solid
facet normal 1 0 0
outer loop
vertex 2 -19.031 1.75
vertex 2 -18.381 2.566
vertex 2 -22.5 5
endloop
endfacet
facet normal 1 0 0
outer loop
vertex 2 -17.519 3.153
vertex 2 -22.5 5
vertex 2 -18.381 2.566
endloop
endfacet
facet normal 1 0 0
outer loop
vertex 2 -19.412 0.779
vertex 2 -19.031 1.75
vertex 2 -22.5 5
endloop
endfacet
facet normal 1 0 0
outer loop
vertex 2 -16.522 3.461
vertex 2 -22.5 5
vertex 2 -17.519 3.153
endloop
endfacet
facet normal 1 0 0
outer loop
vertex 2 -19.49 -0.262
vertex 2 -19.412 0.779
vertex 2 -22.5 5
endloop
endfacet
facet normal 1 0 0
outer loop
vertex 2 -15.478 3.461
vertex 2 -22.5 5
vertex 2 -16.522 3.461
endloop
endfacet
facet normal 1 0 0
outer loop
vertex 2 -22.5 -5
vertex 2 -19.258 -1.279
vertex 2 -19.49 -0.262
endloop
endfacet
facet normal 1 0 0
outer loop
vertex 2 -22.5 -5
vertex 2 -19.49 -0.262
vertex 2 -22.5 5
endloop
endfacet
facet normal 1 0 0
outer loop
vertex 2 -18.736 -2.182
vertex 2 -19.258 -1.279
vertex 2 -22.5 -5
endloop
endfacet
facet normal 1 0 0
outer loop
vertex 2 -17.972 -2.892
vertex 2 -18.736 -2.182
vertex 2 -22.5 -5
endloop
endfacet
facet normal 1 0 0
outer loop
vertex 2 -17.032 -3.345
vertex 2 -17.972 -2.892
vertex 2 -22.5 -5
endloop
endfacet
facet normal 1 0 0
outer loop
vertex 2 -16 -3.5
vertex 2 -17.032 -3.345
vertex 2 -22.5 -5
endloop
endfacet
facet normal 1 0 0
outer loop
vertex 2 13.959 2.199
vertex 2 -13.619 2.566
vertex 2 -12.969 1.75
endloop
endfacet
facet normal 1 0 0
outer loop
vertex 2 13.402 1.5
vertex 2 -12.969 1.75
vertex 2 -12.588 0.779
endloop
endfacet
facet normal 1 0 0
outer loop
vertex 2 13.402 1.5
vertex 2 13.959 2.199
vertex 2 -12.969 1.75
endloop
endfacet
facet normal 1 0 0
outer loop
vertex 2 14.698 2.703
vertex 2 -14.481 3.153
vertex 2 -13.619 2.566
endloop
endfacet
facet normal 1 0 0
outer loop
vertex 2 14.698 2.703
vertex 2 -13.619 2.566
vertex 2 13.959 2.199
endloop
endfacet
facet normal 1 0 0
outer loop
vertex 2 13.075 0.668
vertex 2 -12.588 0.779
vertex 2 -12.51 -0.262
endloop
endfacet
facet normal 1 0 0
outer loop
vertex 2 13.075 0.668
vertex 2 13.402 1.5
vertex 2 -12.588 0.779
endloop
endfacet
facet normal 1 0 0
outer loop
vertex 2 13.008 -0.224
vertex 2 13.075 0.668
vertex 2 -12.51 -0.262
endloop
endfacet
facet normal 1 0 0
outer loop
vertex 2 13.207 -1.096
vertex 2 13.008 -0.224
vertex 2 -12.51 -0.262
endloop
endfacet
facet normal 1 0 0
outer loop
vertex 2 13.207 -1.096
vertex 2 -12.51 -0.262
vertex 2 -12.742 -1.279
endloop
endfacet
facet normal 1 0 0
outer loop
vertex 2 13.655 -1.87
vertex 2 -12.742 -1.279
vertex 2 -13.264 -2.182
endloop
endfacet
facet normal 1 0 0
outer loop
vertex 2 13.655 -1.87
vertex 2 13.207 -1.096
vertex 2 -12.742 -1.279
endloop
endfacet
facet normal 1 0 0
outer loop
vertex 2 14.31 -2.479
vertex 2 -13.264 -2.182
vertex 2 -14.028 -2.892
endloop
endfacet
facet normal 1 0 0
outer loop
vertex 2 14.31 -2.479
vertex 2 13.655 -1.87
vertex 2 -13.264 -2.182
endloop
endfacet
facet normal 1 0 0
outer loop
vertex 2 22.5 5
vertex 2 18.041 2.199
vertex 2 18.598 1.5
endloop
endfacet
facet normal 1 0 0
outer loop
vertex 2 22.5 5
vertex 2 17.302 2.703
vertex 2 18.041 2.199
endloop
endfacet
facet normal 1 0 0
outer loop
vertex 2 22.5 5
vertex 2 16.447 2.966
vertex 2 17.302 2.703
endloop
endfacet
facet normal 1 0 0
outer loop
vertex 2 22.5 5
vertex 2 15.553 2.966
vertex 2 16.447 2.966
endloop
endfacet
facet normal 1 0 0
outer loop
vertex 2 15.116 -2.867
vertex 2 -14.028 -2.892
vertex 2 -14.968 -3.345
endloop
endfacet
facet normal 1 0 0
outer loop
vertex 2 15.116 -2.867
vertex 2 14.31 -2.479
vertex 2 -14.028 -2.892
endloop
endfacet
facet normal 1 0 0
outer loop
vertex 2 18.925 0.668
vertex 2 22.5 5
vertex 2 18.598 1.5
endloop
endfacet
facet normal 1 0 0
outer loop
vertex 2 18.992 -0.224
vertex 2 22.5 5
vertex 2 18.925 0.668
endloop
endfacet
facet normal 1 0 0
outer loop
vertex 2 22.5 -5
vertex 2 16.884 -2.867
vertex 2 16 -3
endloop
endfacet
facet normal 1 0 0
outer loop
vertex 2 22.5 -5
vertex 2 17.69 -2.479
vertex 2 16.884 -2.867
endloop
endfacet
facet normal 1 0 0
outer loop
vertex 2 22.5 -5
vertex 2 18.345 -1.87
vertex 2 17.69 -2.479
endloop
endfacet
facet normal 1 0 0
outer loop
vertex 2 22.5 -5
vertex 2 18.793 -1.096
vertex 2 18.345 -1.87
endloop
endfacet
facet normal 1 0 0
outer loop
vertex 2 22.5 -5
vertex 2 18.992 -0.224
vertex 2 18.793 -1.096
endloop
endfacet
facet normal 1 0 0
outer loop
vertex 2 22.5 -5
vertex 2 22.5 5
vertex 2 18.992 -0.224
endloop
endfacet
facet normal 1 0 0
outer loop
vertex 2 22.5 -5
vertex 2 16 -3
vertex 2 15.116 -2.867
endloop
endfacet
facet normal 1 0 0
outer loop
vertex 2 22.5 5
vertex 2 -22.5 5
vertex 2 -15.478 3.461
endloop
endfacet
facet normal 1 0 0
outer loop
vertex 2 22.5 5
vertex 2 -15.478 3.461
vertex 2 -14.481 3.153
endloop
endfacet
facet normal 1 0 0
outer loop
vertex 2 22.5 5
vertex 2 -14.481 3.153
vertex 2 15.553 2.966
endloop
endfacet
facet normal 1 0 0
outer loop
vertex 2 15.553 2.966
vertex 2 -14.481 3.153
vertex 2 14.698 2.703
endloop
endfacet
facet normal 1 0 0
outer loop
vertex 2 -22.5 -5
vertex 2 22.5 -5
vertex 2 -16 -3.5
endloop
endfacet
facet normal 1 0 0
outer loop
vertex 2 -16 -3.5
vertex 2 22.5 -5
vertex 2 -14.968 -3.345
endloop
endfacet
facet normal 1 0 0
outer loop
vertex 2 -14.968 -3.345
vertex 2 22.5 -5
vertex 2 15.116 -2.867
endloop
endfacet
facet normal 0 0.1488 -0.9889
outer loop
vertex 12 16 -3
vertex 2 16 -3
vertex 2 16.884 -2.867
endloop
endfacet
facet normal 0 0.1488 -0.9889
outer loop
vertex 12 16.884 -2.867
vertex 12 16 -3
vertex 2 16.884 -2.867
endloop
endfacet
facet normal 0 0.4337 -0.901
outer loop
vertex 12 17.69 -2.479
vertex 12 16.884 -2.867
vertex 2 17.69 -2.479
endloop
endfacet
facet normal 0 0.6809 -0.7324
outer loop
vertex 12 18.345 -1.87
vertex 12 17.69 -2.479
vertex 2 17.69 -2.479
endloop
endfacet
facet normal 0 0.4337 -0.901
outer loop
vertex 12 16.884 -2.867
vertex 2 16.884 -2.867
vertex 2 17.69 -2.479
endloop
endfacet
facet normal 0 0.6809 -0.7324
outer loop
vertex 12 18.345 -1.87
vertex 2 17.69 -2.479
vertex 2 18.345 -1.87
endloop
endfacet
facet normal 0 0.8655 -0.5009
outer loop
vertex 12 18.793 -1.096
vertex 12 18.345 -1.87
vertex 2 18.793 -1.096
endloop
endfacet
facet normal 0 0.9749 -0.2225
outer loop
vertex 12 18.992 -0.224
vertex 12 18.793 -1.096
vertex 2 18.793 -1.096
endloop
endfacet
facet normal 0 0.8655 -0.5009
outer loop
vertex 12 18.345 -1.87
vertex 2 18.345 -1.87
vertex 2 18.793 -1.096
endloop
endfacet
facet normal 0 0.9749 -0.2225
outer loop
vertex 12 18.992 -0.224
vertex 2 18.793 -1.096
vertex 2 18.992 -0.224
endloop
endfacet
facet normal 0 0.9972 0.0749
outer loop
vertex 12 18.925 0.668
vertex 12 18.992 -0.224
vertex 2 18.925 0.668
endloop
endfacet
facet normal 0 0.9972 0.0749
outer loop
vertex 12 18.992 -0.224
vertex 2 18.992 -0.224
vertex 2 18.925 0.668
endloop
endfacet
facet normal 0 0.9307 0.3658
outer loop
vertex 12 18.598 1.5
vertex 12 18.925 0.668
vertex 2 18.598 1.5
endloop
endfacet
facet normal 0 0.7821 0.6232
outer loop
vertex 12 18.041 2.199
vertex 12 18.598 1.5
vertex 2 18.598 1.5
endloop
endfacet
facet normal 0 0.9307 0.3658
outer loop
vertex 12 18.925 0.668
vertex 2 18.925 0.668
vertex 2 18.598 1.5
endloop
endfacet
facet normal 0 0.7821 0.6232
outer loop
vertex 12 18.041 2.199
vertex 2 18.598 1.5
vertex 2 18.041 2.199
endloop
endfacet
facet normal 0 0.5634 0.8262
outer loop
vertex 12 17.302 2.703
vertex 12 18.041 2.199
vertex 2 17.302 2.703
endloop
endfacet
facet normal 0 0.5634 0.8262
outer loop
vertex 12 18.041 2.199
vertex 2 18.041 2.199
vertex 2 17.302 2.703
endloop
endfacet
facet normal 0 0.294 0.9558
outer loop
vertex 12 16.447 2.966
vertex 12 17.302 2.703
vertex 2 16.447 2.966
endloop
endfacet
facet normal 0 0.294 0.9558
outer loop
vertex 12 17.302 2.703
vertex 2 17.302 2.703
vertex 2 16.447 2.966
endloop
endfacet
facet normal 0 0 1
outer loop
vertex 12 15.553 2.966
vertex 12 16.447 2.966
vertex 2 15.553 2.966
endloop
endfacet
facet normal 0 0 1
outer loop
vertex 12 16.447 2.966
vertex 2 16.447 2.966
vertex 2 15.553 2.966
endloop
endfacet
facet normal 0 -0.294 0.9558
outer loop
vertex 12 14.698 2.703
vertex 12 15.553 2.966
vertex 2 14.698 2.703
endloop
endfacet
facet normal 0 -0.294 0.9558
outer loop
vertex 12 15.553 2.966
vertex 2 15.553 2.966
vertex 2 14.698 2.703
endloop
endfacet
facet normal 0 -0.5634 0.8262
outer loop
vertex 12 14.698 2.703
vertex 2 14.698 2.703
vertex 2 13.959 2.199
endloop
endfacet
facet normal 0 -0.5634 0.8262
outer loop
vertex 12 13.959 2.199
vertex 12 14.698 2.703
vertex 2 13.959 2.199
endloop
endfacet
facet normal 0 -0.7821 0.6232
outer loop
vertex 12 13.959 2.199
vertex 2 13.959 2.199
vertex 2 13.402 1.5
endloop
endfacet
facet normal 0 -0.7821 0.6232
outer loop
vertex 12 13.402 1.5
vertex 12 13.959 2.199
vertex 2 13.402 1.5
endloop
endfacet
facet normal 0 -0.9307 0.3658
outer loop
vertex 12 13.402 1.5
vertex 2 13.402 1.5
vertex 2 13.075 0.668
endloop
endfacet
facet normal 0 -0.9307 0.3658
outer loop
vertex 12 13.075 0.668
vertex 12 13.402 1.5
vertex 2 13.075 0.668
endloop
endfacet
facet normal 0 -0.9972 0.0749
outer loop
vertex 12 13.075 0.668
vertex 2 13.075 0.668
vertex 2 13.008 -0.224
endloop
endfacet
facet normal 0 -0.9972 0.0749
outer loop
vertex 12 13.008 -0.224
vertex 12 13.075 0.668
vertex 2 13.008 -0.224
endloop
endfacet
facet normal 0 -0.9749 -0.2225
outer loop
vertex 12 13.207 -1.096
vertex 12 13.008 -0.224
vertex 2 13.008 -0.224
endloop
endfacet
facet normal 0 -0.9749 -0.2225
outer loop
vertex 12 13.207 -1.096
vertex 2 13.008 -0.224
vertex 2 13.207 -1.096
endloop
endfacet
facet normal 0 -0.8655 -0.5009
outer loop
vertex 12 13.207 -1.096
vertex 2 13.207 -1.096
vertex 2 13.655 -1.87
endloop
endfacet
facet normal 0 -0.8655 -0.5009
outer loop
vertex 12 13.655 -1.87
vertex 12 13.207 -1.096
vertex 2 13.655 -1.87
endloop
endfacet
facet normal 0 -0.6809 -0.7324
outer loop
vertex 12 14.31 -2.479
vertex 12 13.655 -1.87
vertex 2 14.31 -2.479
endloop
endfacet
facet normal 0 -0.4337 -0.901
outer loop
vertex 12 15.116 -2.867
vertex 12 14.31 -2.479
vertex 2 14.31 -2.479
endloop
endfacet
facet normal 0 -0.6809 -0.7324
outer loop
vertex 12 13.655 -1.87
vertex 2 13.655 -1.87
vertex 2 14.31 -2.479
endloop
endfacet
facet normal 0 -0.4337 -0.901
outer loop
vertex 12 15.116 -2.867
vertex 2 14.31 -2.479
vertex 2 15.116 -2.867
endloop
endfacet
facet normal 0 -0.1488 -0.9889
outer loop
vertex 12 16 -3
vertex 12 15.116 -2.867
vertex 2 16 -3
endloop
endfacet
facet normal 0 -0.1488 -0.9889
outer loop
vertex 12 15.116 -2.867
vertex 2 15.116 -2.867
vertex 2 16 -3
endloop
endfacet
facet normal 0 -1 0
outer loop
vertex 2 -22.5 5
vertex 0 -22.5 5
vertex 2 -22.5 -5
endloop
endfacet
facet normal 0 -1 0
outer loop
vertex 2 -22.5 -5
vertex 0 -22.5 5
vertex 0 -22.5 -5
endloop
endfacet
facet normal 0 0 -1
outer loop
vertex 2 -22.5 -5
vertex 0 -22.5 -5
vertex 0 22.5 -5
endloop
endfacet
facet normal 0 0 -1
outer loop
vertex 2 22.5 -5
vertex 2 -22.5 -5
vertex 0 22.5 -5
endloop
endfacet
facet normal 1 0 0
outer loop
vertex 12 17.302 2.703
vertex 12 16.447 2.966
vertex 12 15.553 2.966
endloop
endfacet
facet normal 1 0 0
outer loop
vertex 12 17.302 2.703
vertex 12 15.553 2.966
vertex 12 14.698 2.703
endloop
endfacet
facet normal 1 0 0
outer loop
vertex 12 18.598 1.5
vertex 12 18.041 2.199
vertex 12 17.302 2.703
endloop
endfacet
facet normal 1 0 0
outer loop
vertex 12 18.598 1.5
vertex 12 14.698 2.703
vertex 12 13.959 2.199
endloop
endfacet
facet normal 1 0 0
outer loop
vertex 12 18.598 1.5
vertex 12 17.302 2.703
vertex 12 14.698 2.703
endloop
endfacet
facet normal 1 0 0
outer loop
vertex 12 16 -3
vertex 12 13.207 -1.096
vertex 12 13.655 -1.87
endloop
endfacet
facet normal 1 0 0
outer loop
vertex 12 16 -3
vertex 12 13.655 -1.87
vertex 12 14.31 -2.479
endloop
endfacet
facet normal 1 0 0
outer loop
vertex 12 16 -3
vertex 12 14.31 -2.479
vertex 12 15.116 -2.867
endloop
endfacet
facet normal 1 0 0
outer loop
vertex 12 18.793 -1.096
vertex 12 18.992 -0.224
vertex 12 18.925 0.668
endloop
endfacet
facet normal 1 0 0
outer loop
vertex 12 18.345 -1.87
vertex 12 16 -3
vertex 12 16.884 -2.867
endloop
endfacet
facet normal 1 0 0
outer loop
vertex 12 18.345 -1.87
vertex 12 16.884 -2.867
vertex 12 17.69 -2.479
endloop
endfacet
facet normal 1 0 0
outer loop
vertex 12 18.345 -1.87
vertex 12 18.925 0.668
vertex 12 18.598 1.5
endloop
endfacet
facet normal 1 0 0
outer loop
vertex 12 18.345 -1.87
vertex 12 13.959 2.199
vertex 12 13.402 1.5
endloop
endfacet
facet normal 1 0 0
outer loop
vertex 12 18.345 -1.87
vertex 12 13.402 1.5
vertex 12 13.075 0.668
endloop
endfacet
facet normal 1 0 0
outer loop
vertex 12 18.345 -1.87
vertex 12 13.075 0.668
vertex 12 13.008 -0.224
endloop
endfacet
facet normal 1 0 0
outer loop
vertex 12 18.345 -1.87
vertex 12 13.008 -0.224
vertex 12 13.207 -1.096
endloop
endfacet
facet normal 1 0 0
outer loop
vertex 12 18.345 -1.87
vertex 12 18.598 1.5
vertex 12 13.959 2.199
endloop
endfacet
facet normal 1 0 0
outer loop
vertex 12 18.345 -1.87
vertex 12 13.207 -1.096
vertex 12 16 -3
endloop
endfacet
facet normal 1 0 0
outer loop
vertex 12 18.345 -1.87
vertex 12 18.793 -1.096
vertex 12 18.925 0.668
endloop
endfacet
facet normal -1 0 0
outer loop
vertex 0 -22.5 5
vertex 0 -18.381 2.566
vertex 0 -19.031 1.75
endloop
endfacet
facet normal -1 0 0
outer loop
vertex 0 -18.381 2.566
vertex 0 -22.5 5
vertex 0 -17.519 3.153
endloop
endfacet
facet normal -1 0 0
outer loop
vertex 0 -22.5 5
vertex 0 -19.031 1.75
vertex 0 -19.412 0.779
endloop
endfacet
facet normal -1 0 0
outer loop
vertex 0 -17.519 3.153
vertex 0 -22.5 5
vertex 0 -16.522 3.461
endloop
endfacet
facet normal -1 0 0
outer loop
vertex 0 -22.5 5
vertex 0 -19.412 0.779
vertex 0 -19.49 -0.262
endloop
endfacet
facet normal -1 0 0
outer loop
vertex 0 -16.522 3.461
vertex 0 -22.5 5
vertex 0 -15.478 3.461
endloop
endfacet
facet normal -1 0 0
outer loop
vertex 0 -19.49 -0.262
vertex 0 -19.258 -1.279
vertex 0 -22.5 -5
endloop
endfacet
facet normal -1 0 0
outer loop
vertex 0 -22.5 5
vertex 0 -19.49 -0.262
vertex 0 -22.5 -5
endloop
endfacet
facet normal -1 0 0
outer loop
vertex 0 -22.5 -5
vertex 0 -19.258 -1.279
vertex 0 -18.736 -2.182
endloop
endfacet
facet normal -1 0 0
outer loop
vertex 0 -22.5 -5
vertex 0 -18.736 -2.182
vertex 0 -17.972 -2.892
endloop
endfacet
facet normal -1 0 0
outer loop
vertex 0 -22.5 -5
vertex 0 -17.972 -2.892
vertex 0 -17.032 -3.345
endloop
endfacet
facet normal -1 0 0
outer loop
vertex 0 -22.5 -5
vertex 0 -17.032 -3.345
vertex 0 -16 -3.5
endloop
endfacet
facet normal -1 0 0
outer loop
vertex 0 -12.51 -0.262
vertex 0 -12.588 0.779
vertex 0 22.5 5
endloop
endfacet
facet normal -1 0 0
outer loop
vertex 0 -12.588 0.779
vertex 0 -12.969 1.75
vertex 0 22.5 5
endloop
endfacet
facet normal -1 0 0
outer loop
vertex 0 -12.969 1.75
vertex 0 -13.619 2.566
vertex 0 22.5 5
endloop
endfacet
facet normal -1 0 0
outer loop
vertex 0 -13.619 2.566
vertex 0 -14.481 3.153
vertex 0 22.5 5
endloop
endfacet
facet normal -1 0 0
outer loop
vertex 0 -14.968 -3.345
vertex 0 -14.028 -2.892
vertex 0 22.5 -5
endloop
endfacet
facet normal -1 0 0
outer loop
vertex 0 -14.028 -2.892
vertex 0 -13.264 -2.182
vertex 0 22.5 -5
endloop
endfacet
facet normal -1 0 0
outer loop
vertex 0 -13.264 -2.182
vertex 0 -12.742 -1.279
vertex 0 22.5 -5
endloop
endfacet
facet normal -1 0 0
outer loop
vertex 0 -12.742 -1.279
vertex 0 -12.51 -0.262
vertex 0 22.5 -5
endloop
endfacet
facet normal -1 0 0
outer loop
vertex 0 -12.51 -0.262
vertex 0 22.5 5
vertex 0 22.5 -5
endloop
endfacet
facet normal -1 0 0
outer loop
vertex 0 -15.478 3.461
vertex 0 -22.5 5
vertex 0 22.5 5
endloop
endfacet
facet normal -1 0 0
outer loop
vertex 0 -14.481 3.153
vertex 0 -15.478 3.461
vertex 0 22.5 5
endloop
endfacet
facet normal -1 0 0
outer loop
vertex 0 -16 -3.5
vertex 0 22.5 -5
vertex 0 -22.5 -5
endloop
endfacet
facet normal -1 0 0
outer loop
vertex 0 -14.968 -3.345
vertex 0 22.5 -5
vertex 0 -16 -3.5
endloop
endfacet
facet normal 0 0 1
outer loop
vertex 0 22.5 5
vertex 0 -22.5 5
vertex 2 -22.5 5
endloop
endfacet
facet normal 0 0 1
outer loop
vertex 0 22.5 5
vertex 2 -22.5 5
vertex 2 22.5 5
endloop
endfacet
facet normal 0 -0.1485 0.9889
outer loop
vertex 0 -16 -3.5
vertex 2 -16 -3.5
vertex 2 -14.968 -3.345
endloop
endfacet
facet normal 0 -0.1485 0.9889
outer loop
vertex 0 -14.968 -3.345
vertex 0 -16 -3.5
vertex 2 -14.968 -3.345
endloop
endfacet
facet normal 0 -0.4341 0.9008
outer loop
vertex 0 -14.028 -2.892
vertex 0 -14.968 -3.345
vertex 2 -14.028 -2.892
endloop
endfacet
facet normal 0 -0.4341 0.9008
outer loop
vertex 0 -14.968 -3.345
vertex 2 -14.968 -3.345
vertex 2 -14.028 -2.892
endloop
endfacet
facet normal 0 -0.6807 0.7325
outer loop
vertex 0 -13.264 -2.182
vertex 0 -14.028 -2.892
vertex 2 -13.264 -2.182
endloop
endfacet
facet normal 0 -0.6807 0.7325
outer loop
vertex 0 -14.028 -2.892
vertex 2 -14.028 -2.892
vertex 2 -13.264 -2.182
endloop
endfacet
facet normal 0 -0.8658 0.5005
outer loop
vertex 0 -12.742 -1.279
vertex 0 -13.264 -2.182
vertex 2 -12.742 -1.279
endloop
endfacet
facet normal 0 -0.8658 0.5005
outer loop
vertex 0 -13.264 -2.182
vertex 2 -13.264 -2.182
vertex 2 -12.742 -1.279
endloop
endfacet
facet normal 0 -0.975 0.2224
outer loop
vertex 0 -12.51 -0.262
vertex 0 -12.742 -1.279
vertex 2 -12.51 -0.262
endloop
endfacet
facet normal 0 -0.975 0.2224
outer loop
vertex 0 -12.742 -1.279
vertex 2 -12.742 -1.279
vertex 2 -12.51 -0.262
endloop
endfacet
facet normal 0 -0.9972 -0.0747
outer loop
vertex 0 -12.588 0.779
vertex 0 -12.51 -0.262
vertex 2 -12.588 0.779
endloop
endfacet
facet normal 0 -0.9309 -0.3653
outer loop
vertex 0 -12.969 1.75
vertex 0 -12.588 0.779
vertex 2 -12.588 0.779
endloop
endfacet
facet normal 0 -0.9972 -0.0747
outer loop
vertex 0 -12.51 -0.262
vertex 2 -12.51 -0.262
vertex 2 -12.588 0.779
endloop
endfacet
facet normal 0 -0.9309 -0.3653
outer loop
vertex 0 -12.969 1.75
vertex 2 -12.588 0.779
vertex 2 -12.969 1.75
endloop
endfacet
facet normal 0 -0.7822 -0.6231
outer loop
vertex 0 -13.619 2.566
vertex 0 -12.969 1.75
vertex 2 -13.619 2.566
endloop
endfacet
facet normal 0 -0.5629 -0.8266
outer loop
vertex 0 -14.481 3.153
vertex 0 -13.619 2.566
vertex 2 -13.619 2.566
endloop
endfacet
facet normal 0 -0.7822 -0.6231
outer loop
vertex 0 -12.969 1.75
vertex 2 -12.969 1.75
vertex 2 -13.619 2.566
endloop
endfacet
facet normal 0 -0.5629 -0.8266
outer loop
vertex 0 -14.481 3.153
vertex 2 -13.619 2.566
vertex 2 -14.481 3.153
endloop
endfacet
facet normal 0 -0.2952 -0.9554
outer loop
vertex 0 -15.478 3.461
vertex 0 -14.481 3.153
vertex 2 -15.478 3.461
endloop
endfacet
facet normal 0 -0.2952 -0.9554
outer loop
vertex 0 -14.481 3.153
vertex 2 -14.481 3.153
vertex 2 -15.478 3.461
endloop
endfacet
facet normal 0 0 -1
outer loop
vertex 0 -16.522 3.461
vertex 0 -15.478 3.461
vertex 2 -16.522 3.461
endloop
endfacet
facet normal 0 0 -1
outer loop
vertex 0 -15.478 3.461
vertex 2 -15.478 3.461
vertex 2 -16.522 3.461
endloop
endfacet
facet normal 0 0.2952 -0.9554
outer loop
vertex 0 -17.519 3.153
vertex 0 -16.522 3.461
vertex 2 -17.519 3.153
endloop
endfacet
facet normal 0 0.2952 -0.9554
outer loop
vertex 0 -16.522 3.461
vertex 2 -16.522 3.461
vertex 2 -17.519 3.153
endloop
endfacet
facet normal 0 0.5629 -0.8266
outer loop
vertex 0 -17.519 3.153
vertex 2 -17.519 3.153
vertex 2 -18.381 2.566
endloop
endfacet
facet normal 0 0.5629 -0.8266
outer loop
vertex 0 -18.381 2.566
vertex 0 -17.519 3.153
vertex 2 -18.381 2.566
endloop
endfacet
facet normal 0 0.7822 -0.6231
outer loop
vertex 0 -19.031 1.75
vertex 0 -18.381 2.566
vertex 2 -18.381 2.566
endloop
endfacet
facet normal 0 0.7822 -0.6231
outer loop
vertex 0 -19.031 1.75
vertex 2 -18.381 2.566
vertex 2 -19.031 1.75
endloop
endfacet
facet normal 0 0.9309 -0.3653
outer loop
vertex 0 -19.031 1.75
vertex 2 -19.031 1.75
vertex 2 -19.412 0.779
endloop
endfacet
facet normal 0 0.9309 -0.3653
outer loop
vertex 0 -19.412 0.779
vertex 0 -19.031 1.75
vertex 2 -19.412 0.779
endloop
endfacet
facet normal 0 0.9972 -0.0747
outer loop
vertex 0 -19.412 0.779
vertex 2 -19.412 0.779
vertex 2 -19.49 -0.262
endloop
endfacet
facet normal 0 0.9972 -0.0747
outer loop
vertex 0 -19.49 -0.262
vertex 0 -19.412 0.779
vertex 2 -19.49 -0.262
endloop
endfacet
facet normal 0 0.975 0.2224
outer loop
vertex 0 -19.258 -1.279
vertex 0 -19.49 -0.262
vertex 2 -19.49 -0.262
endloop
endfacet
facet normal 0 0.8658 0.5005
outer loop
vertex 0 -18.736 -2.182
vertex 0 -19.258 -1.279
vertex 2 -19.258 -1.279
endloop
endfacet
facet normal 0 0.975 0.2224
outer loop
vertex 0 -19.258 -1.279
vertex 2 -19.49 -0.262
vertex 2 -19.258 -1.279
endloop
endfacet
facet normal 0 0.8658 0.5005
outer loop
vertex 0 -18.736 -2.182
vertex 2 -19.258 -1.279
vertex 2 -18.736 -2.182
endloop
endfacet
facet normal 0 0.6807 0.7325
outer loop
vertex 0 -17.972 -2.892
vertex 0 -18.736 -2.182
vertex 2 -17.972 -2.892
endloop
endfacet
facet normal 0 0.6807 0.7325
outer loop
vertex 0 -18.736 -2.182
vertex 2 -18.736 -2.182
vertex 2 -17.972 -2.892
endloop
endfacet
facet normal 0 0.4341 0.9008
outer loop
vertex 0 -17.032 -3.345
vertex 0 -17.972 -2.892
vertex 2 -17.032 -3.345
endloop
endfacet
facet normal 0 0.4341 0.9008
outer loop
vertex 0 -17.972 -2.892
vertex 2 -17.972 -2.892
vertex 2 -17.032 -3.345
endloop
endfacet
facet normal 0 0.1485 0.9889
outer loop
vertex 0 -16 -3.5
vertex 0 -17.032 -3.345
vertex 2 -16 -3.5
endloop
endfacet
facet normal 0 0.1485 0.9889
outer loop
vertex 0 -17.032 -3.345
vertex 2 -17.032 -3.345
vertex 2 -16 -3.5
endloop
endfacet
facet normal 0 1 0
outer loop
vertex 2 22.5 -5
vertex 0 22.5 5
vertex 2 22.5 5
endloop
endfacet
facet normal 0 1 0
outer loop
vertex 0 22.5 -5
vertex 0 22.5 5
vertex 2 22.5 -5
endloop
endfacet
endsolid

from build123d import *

# Parameters (mm, degrees)
SKETCH1_W           = 10
SKETCH1_H           = 45
BOSS_EXTRUDE1_DEPTH = 2
SKETCH2_R           = 3.5
CUT_EXTRUDE1_DEPTH  = 2
SKETCH3_R           = 3
BOSS_EXTRUDE2_DEPTH = 10


with BuildPart() as part:
    # Sketch1 → Boss-Extrude1 (new body)
    with BuildSketch(Plane(origin=(0, 0, 0), x_dir=(0, 0, -1), z_dir=(1, 0, 0))):
        Rectangle(SKETCH1_W, SKETCH1_H)
    extrude(amount=BOSS_EXTRUDE1_DEPTH)

    # Sketch2 → Cut-Extrude1 (cut)
    with BuildSketch(Plane(origin=(2, 0, 0), x_dir=(0, 0, -1), z_dir=(1, 0, 0))):
        with Locations((0, -16)):
            Circle(SKETCH2_R)
    extrude(amount=-CUT_EXTRUDE1_DEPTH, mode=Mode.SUBTRACT)

    # Sketch3 → Boss-Extrude2 (add)
    with BuildSketch(Plane(origin=(2, 0, 0), x_dir=(0, 0, -1), z_dir=(1, 0, 0))):
        with Locations((0, 16)):
            Circle(SKETCH3_R)
    extrude(amount=BOSS_EXTRUDE2_DEPTH)


solid = part.part
